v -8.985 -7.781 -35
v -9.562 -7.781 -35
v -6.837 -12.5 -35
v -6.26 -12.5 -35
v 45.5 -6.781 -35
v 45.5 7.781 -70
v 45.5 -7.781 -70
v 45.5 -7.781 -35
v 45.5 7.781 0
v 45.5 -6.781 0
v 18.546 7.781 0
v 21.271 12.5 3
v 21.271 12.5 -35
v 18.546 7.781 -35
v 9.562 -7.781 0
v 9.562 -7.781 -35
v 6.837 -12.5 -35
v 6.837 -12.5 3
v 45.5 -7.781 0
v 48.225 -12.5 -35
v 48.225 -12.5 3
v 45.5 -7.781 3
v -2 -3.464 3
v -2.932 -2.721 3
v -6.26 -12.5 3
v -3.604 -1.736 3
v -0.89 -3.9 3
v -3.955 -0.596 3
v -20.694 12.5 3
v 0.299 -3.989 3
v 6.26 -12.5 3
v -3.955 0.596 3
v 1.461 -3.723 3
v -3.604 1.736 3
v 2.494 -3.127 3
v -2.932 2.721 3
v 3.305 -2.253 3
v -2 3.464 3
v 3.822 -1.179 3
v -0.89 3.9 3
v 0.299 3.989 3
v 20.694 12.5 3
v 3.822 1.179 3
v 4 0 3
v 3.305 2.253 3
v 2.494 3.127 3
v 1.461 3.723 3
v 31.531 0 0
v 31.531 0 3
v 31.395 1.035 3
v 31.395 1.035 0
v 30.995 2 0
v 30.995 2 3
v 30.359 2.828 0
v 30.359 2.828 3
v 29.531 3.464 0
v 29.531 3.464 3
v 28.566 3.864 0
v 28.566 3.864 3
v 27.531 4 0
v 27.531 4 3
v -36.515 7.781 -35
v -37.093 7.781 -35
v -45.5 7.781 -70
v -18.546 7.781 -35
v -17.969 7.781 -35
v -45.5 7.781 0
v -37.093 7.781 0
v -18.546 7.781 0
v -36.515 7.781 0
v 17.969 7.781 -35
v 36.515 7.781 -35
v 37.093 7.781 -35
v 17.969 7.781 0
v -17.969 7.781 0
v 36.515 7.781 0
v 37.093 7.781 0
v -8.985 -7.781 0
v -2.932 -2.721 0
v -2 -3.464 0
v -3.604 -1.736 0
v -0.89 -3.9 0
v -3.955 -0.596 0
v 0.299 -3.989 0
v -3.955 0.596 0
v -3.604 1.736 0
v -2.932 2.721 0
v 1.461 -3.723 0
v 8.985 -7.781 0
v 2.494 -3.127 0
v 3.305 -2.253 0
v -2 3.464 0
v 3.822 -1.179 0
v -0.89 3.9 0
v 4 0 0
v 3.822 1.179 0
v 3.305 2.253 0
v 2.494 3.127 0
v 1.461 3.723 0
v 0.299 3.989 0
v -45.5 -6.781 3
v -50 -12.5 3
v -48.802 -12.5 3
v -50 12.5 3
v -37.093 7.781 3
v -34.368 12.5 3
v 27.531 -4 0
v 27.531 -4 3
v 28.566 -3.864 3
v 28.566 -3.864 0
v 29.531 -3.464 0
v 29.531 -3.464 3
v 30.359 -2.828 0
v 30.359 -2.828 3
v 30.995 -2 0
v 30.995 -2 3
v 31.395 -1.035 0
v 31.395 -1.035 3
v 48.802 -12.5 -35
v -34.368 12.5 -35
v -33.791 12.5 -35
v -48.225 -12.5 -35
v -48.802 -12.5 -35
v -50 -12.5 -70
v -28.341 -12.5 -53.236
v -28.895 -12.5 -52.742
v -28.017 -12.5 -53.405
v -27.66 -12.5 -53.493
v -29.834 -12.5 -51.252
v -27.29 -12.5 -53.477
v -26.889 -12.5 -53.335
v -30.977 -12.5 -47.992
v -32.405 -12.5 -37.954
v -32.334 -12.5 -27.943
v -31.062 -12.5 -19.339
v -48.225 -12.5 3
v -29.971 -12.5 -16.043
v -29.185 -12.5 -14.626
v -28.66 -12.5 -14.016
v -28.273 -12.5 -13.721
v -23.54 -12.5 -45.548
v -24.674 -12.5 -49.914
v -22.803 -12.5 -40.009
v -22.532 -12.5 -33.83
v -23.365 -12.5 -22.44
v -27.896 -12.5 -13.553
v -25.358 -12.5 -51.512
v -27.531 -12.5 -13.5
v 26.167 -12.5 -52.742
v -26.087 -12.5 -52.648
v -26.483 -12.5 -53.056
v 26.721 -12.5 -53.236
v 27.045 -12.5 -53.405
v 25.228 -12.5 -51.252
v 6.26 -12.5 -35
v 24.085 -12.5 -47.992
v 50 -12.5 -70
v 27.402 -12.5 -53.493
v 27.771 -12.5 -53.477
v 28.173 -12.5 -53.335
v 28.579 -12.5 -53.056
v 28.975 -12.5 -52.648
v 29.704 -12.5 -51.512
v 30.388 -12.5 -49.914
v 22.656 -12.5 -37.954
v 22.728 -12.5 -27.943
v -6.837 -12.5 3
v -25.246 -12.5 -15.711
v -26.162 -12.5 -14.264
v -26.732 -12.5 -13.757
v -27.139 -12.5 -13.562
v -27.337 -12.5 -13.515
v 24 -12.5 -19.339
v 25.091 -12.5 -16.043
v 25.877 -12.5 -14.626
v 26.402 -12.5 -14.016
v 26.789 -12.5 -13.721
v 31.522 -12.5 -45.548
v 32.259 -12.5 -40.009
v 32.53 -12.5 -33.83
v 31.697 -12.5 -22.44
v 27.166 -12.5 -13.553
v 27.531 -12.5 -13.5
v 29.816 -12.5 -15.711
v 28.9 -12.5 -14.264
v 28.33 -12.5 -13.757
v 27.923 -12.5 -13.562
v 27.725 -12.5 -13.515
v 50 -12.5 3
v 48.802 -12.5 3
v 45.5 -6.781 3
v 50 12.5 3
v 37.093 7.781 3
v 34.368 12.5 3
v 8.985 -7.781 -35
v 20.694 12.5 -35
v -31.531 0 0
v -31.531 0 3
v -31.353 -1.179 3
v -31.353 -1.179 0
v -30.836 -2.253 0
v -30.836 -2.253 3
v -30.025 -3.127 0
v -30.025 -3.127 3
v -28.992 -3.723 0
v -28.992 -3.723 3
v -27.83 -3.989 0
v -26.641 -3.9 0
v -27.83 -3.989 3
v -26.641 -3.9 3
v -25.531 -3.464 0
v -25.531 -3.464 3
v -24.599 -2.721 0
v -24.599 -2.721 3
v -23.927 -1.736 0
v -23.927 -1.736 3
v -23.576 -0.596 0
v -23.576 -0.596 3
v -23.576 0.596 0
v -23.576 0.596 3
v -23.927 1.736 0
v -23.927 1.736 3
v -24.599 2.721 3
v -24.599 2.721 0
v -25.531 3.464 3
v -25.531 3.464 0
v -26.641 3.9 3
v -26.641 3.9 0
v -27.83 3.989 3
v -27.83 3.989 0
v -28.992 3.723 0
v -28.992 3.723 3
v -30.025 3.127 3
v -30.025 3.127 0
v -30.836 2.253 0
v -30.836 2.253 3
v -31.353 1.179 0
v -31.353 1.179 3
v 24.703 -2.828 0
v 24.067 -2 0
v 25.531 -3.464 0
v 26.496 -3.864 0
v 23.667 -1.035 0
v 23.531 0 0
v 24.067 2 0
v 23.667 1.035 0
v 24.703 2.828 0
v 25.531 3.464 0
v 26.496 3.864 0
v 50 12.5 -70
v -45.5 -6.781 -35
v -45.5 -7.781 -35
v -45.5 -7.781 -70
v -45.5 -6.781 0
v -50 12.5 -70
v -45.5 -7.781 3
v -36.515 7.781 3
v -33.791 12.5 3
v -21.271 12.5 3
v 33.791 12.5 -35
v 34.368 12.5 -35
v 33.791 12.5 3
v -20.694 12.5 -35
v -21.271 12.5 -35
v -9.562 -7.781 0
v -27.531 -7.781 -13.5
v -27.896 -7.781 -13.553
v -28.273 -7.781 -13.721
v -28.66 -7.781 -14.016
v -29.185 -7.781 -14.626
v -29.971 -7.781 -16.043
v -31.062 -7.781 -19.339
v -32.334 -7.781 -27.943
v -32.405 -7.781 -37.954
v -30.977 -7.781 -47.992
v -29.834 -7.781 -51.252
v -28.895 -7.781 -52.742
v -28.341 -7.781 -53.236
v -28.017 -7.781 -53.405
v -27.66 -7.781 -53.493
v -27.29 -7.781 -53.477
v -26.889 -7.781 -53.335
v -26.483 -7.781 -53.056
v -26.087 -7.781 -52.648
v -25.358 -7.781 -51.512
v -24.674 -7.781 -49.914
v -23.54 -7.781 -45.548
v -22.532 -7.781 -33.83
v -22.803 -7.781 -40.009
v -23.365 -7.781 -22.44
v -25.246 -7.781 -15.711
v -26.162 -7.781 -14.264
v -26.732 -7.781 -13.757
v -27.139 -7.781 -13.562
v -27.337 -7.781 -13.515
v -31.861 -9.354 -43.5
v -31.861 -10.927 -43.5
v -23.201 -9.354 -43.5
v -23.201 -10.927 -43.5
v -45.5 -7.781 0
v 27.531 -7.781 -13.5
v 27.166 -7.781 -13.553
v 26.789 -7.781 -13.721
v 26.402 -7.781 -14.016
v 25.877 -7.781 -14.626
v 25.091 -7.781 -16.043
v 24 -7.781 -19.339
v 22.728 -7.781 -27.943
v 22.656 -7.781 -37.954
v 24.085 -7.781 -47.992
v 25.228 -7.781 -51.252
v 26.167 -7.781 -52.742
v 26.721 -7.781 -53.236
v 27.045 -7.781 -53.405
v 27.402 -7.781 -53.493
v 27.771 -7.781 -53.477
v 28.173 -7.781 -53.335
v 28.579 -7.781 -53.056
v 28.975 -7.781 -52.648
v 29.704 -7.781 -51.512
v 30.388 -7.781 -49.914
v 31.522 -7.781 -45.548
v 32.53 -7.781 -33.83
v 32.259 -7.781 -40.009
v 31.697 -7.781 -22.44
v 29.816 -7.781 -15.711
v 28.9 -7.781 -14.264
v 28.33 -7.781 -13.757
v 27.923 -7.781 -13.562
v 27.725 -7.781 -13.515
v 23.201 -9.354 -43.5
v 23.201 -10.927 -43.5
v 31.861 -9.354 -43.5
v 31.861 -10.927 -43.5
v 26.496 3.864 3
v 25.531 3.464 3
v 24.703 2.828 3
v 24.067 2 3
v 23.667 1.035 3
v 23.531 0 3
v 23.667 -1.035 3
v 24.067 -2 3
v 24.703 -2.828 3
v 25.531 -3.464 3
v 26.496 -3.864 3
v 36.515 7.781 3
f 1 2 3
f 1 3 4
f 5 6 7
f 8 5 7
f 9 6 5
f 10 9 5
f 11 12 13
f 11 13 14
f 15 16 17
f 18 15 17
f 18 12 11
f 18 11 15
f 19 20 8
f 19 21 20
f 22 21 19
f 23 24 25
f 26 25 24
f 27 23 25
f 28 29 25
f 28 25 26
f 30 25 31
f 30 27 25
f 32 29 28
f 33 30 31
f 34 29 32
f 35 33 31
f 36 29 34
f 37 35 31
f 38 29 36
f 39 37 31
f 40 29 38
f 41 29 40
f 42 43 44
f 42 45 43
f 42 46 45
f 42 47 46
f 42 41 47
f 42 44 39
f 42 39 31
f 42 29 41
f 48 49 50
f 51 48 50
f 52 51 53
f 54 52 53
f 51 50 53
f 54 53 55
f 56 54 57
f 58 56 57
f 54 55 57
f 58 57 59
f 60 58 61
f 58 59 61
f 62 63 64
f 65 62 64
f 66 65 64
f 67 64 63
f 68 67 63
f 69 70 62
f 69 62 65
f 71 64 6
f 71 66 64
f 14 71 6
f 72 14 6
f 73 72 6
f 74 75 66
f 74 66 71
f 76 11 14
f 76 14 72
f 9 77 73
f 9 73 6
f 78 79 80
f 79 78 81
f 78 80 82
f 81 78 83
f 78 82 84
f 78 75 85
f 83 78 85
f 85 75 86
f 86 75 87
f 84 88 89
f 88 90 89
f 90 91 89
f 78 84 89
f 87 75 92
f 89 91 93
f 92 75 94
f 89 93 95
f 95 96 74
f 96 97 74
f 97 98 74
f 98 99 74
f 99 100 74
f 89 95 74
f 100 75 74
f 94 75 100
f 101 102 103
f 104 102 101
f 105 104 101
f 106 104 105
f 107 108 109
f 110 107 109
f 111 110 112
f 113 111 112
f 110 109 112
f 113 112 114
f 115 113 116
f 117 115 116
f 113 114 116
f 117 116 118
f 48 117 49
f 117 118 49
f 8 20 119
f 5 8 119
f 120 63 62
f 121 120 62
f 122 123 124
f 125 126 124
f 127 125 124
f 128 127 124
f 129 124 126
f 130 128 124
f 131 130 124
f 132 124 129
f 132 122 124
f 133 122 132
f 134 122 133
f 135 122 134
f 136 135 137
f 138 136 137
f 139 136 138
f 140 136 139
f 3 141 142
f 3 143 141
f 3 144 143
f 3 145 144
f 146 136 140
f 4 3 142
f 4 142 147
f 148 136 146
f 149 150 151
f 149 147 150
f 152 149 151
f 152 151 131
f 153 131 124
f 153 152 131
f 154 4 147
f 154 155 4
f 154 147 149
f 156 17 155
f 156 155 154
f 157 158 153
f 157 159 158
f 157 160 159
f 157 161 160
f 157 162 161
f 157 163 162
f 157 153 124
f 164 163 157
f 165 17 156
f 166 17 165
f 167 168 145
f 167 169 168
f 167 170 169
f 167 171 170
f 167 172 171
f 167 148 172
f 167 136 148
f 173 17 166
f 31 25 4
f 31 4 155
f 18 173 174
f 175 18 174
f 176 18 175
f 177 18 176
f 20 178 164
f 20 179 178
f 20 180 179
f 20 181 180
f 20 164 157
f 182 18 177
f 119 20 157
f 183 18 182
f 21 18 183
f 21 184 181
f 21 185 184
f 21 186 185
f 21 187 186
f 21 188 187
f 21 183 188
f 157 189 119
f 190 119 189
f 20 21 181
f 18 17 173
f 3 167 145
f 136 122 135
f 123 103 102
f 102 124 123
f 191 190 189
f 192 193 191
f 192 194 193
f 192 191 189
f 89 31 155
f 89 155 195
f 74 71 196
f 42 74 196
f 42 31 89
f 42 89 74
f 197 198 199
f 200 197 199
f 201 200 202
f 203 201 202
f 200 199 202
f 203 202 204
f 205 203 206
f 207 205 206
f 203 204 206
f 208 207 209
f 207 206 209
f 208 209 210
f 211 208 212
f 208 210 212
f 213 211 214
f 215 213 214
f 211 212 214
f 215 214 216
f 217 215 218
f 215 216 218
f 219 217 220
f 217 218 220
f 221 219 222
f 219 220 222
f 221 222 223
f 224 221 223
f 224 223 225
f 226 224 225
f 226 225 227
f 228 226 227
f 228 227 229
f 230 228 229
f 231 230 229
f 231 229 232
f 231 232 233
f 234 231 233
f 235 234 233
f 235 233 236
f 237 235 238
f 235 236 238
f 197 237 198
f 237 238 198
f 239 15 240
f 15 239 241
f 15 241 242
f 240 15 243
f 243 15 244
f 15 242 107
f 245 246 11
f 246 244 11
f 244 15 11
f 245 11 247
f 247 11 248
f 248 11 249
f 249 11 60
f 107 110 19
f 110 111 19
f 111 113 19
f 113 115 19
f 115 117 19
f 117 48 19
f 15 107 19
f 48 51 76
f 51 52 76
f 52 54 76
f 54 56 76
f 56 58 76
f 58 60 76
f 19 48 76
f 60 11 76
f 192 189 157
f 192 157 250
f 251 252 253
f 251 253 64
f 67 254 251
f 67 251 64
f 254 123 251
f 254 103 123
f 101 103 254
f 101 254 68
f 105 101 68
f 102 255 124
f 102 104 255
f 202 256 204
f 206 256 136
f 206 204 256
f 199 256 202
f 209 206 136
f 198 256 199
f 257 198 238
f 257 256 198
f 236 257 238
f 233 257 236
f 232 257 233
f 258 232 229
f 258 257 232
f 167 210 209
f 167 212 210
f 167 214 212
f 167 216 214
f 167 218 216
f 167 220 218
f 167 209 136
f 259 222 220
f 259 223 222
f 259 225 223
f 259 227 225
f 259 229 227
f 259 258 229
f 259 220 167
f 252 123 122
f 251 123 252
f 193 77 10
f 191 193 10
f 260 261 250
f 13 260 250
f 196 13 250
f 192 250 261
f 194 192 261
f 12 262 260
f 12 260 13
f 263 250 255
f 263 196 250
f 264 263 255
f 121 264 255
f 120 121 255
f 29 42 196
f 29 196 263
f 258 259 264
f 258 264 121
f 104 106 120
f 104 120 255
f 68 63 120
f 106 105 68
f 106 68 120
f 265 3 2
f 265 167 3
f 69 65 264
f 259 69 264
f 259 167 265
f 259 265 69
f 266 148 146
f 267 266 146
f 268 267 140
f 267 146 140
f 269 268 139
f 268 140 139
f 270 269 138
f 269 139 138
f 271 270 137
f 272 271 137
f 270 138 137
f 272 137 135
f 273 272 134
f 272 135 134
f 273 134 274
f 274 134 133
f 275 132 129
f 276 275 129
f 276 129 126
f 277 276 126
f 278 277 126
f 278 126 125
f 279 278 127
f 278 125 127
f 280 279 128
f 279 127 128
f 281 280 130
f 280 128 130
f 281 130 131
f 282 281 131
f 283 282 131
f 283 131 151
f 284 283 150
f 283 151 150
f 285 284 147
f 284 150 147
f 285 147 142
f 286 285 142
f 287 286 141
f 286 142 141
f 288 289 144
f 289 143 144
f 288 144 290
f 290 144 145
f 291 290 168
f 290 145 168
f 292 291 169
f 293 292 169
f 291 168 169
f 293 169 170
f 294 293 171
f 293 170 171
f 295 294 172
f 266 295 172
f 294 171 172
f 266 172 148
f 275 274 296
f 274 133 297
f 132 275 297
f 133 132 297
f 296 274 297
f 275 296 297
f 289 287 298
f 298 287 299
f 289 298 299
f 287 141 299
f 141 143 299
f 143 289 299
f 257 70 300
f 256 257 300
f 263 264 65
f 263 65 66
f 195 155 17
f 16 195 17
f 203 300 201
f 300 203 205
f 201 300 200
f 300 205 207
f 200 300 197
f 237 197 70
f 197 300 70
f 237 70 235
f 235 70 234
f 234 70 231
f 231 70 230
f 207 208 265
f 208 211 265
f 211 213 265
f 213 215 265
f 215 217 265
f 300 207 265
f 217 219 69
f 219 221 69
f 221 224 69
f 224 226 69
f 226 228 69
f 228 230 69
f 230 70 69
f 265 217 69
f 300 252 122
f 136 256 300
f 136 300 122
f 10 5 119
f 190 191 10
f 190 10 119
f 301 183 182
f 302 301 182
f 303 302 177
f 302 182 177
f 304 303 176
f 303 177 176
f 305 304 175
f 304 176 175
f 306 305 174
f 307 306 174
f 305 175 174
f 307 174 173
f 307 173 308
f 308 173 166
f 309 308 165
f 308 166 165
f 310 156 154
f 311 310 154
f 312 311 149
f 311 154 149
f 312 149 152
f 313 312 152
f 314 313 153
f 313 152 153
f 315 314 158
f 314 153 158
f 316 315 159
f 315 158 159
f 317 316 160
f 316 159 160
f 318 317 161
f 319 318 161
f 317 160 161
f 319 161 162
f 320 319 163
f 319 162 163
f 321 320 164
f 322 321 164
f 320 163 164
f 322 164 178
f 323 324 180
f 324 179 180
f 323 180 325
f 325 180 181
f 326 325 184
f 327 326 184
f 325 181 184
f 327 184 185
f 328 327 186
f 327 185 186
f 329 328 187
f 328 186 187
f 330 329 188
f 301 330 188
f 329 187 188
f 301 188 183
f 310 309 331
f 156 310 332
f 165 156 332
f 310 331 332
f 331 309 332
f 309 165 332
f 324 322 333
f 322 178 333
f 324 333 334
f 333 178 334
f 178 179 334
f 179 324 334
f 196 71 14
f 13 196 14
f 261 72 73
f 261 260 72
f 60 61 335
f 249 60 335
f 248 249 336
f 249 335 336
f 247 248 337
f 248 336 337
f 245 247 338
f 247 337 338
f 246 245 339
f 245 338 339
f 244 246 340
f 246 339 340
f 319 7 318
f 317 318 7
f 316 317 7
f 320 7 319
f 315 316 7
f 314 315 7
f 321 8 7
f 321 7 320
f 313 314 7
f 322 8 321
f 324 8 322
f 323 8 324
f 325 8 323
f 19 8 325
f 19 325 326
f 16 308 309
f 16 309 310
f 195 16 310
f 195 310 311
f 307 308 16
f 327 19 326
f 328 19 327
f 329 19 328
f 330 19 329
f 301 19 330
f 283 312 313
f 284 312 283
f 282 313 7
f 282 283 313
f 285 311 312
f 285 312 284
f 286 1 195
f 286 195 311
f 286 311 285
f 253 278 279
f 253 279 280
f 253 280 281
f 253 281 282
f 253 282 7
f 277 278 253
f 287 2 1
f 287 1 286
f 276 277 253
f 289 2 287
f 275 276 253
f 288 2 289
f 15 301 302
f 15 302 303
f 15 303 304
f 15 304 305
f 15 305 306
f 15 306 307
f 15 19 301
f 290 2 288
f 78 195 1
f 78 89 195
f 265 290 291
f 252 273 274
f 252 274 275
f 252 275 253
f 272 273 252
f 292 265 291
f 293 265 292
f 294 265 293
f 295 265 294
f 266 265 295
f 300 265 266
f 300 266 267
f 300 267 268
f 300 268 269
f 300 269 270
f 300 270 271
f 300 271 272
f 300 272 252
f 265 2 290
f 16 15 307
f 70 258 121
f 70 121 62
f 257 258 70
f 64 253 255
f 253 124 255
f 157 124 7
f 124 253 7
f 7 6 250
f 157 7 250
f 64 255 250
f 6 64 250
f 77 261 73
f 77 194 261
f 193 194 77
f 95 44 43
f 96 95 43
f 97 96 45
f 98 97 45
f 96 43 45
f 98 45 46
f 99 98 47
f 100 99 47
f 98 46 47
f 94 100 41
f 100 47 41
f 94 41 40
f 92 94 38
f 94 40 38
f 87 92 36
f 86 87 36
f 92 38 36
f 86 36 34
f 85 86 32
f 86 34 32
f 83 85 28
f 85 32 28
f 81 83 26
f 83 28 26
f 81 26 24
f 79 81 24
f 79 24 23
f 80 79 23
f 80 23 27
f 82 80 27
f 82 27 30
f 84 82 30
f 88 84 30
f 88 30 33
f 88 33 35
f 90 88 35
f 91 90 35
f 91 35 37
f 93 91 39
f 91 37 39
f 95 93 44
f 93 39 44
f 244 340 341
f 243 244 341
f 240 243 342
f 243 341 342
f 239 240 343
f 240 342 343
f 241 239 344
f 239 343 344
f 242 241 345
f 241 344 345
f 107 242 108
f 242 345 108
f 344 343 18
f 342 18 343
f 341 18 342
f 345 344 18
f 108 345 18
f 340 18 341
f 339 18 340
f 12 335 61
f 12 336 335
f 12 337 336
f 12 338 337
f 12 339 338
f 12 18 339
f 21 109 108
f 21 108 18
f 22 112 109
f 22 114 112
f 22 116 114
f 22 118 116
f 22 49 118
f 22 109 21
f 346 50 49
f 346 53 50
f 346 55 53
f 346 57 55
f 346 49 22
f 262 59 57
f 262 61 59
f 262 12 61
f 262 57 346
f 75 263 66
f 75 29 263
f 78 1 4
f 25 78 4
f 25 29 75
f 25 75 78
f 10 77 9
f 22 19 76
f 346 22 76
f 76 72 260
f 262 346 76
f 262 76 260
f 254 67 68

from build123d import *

# Parameters (mm, degrees)
F1_DEPTH = 3
F2_DEPTH = 35
F3_START = -35
F3_DEPTH = 35
F5_DEPTH = 4.7191688256
F7_DEPTH = 3


with BuildPart() as f1:
    # F0 (on Top) → F1 (new body)
    with BuildSketch(Plane.XY):
        Polygon((8.9845299462, -7.7808311744), (-8.9845299462, -7.7808311744), (-6.2599165544, -12.5), (6.2599165544, -12.5), align=None)
        Polygon((-20.6936732841, 12.5), (-17.9690598923, 7.7808311744), (17.9690598923, 7.7808311744), (20.6936732841, 12.5), align=None)
        Polygon((-17.9690598923, 7.7808311744), (-8.9845299462, -7.7808311744), (8.9845299462, -7.7808311744), (17.9690598923, 7.7808311744), align=None)
    extrude(amount=F1_DEPTH)

    # F0 (on Top) → F2, piece 2 (join)
    with BuildSketch(Plane.XY):
        Polygon((-20.6936732841, 12.5), (-17.9690598923, 7.7808311744), (17.9690598923, 7.7808311744), (20.6936732841, 12.5), align=None)
        Polygon((8.9845299462, -7.7808311744), (-8.9845299462, -7.7808311744), (-6.2599165544, -12.5), (6.2599165544, -12.5), align=None)
    extrude(amount=-F2_DEPTH)



with BuildPart() as f1b:
    # F0 (on Top) → F1, piece 2 (new body)
    with BuildSketch(Plane.XY):
        Polygon((-45.5, 7.7808311744), (-45.5, -6.7808311744), (-37.092820323, 7.7808311744), align=None)
        Polygon((-48.801963661, -12.5), (-45.5, -6.7808311744), (-45.5, 7.7808311744), (-37.092820323, 7.7808311744), (-34.3682069312, 12.5), (-50, 12.5), (-50, -12.5), align=None)
    extrude(amount=F1_DEPTH)

    # F0 (on Top) → F2 (join)
    with BuildSketch(Plane.XY):
        Polygon((-48.801963661, -12.5), (-45.5, -6.7808311744), (-45.5, 7.7808311744), (-37.092820323, 7.7808311744), (-34.3682069312, 12.5), (-50, 12.5), (-50, -12.5), align=None)
    extrude(amount=-F2_DEPTH)


with BuildPart() as f1c:
    # F0 (on Top) → F1, piece 3 (new body)
    with BuildSketch(Plane.XY):
        Polygon((37.092820323, 7.7808311744), (45.5, -6.7808311744), (45.5, 7.7808311744), align=None)
        Polygon((45.5, 7.7808311744), (45.5, -6.7808311744), (48.801963661, -12.5), (50, -12.5), (50, 12.5), (34.3682069312, 12.5), (37.092820323, 7.7808311744), align=None)
    extrude(amount=F1_DEPTH)

    # F0 (on Top) → F2, piece 4 (join)
    with BuildSketch(Plane.XY):
        Polygon((45.5, 7.7808311744), (45.5, -6.7808311744), (48.801963661, -12.5), (50, -12.5), (50, 12.5), (34.3682069312, 12.5), (37.092820323, 7.7808311744), align=None)
    extrude(amount=-F2_DEPTH)


with BuildPart() as f1d:
    # F0 (on Top) → F1, piece 4 (new body)
    with BuildSketch(Plane.XY):
        Polygon((21.2710235533, 12.5), (18.5464101615, 7.7808311744), (36.5154700538, 7.7808311744), (33.790856662, 12.5), align=None)
        Polygon((45.5, -7.7808311744), (9.5618802154, -7.7808311744), (6.8372668236, -12.5), (48.2246133918, -12.5), align=None)
        Polygon((18.5464101615, 7.7808311744), (9.5618802154, -7.7808311744), (45.5, -7.7808311744), (36.5154700538, 7.7808311744), align=None)
    extrude(amount=F1_DEPTH)

    # F0 (on Top) → F2, piece 3 (join)
    with BuildSketch(Plane.XY):
        Polygon((45.5, -7.7808311744), (9.5618802154, -7.7808311744), (6.8372668236, -12.5), (48.2246133918, -12.5), align=None)
        Polygon((21.2710235533, 12.5), (18.5464101615, 7.7808311744), (36.5154700538, 7.7808311744), (33.790856662, 12.5), align=None)
    extrude(amount=-F2_DEPTH)


with BuildPart() as f1e:
    # F0 (on Top) → F1, piece 5 (new body)
    with BuildSketch(Plane.XY):
        Polygon((-36.5154700538, 7.7808311744), (-45.5, -7.7808311744), (-9.5618802154, -7.7808311744), (-18.5464101615, 7.7808311744), align=None)
        Polygon((-33.790856662, 12.5), (-36.5154700538, 7.7808311744), (-18.5464101615, 7.7808311744), (-21.2710235533, 12.5), align=None)
        Polygon((-9.5618802154, -7.7808311744), (-45.5, -7.7808311744), (-48.2246133918, -12.5), (-6.8372668236, -12.5), align=None)
    extrude(amount=F1_DEPTH)

    # F0 (on Top) → F2, piece 5 (join)
    with BuildSketch(Plane.XY):
        Polygon((-9.5618802154, -7.7808311744), (-45.5, -7.7808311744), (-48.2246133918, -12.5), (-6.8372668236, -12.5), align=None)
        Polygon((-33.790856662, 12.5), (-36.5154700538, 7.7808311744), (-18.5464101615, 7.7808311744), (-21.2710235533, 12.5), align=None)
    extrude(amount=-F2_DEPTH)


with BuildPart() as f1_1:
    add(f1.part)

    add(f1b.part)  # F3 merges F1b

    add(f1c.part)  # F3 merges F1c

    add(f1d.part)  # F3 merges F1d

    add(f1e.part)  # F3 merges F1e
    # F0 (on Top) → F3 (join)
    with BuildSketch(Plane.XY.offset(F3_START)):
        Polygon((-8.9845299462, -7.7808311744), (-9.5618802154, -7.7808311744), (-6.8372668236, -12.5), (-6.2599165544, -12.5), align=None)
        Polygon((-33.790856662, 12.5), (-36.5154700538, 7.7808311744), (-18.5464101615, 7.7808311744), (-21.2710235533, 12.5), align=None)
        Polygon((-48.2246133918, -12.5), (-45.5, -7.7808311744), (-45.5, -6.7808311744), (-48.801963661, -12.5), align=None)
        Polygon((45.5, -6.7808311744), (45.5, -7.7808311744), (48.2246133918, -12.5), (48.801963661, -12.5), align=None)
        Polygon((8.9845299462, -7.7808311744), (-8.9845299462, -7.7808311744), (-6.2599165544, -12.5), (6.2599165544, -12.5), align=None)
        Polygon((-9.5618802154, -7.7808311744), (-45.5, -7.7808311744), (-48.2246133918, -12.5), (-6.8372668236, -12.5), align=None)
        Polygon((9.5618802154, -7.7808311744), (8.9845299462, -7.7808311744), (6.2599165544, -12.5), (6.8372668236, -12.5), align=None)
        Polygon((45.5, -7.7808311744), (9.5618802154, -7.7808311744), (6.8372668236, -12.5), (48.2246133918, -12.5), align=None)
        Polygon((-48.801963661, -12.5), (-45.5, -6.7808311744), (-45.5, 7.7808311744), (-37.092820323, 7.7808311744), (-34.3682069312, 12.5), (-50, 12.5), (-50, -12.5), align=None)
        Polygon((-37.092820323, 7.7808311744), (-36.5154700538, 7.7808311744), (-33.790856662, 12.5), (-34.3682069312, 12.5), align=None)
        Polygon((-21.2710235533, 12.5), (-18.5464101615, 7.7808311744), (-17.9690598923, 7.7808311744), (-20.6936732841, 12.5), align=None)
        Polygon((-20.6936732841, 12.5), (-17.9690598923, 7.7808311744), (17.9690598923, 7.7808311744), (20.6936732841, 12.5), align=None)
        Polygon((20.6936732841, 12.5), (17.9690598923, 7.7808311744), (18.5464101615, 7.7808311744), (21.2710235533, 12.5), align=None)
        Polygon((33.790856662, 12.5), (36.5154700538, 7.7808311744), (37.092820323, 7.7808311744), (34.3682069312, 12.5), align=None)
        Polygon((45.5, 7.7808311744), (45.5, -6.7808311744), (48.801963661, -12.5), (50, -12.5), (50, 12.5), (34.3682069312, 12.5), (37.092820323, 7.7808311744), align=None)
        Polygon((21.2710235533, 12.5), (18.5464101615, 7.7808311744), (36.5154700538, 7.7808311744), (33.790856662, 12.5), align=None)
    extrude(amount=-F3_DEPTH)

    # F4 (on face) → F5 (cut, through all)
    with BuildSketch(Plane.XZ.offset(12.5)):
        with BuildLine():
            add(Edge.make_bspline(
                [(-27.5309401077, -13.5), (-36.1911941455, -13.5), (-31.8610671266, -43.5), (-27.5309401077, -73.5), (-23.2008130888, -43.5), (-18.8706860698, -13.5), (-27.5309401077, -13.5)],
                knots=[0, 0, 0, 2.0943951024, 2.0943951024, 4.1887902048, 4.1887902048, 6.2831853072, 6.2831853072, 6.2831853072], degree=2, weights=[1, 0.5, 1, 0.5, 1, 0.5, 1]))
        make_face()
        with BuildLine():
            add(Edge.make_bspline(
                [(27.5309401077, -13.5), (18.8706860698, -13.5), (23.2008130888, -43.5), (27.5309401077, -73.5), (31.8610671266, -43.5), (36.1911941455, -13.5), (27.5309401077, -13.5)],
                knots=[0, 0, 0, 2.0943951024, 2.0943951024, 4.1887902048, 4.1887902048, 6.2831853072, 6.2831853072, 6.2831853072], degree=2, weights=[1, 0.5, 1, 0.5, 1, 0.5, 1]))
        make_face()
    extrude(amount=-F5_DEPTH, mode=Mode.SUBTRACT)

    # F6 (on face) → F7 (cut, through all)
    with BuildSketch(Plane.XY.offset(3)):
        with BuildLine():
            ThreePointArc((-23.5309401077, 0), (-27.5309401077, 4), (-31.5309401077, 0))
            Line((-31.5309401077, 0), (-23.5309401077, 0))
        make_face()
        with BuildLine():
            Line((-23.5309401077, 0), (-31.5309401077, 0))
            ThreePointArc((-31.5309401077, 0), (-27.5309401077, -4), (-23.5309401077, 0))
        make_face()
        with BuildLine():
            Line((4, 0), (-4, 0))
            ThreePointArc((-4, 0), (0, -4), (4, 0))
        make_face()
        with BuildLine():
            ThreePointArc((4, 0), (0, 4), (-4, 0))
            Line((-4, 0), (4, 0))
        make_face()
        with BuildLine():
            Line((31.5309401077, 0), (27.5309401077, 0))
            Line((27.5309401077, 0), (27.5309401077, -4))
            ThreePointArc((27.5309401077, -4), (30.3593672324, -2.8284271247), (31.5309401077, 0))
        make_face()
        with BuildLine():
            Line((27.5309401077, 0), (23.5309401077, 0))
            ThreePointArc((23.5309401077, 0), (24.7025129829, -2.8284271247), (27.5309401077, -4))
            Line((27.5309401077, -4), (27.5309401077, 0))
        make_face()
        with BuildLine():
            ThreePointArc((27.5309401077, 4), (24.7025129829, 2.8284271247), (23.5309401077, 0))
            Line((23.5309401077, 0), (27.5309401077, 0))
            Line((27.5309401077, 0), (27.5309401077, 4))
        make_face()
        with BuildLine():
            Line((27.5309401077, 4), (27.5309401077, 0))
            Line((27.5309401077, 0), (31.5309401077, 0))
            ThreePointArc((31.5309401077, 0), (30.3593672324, 2.8284271247), (27.5309401077, 4))
        make_face()
    extrude(amount=-F7_DEPTH, mode=Mode.SUBTRACT)


solid = f1_1.part
